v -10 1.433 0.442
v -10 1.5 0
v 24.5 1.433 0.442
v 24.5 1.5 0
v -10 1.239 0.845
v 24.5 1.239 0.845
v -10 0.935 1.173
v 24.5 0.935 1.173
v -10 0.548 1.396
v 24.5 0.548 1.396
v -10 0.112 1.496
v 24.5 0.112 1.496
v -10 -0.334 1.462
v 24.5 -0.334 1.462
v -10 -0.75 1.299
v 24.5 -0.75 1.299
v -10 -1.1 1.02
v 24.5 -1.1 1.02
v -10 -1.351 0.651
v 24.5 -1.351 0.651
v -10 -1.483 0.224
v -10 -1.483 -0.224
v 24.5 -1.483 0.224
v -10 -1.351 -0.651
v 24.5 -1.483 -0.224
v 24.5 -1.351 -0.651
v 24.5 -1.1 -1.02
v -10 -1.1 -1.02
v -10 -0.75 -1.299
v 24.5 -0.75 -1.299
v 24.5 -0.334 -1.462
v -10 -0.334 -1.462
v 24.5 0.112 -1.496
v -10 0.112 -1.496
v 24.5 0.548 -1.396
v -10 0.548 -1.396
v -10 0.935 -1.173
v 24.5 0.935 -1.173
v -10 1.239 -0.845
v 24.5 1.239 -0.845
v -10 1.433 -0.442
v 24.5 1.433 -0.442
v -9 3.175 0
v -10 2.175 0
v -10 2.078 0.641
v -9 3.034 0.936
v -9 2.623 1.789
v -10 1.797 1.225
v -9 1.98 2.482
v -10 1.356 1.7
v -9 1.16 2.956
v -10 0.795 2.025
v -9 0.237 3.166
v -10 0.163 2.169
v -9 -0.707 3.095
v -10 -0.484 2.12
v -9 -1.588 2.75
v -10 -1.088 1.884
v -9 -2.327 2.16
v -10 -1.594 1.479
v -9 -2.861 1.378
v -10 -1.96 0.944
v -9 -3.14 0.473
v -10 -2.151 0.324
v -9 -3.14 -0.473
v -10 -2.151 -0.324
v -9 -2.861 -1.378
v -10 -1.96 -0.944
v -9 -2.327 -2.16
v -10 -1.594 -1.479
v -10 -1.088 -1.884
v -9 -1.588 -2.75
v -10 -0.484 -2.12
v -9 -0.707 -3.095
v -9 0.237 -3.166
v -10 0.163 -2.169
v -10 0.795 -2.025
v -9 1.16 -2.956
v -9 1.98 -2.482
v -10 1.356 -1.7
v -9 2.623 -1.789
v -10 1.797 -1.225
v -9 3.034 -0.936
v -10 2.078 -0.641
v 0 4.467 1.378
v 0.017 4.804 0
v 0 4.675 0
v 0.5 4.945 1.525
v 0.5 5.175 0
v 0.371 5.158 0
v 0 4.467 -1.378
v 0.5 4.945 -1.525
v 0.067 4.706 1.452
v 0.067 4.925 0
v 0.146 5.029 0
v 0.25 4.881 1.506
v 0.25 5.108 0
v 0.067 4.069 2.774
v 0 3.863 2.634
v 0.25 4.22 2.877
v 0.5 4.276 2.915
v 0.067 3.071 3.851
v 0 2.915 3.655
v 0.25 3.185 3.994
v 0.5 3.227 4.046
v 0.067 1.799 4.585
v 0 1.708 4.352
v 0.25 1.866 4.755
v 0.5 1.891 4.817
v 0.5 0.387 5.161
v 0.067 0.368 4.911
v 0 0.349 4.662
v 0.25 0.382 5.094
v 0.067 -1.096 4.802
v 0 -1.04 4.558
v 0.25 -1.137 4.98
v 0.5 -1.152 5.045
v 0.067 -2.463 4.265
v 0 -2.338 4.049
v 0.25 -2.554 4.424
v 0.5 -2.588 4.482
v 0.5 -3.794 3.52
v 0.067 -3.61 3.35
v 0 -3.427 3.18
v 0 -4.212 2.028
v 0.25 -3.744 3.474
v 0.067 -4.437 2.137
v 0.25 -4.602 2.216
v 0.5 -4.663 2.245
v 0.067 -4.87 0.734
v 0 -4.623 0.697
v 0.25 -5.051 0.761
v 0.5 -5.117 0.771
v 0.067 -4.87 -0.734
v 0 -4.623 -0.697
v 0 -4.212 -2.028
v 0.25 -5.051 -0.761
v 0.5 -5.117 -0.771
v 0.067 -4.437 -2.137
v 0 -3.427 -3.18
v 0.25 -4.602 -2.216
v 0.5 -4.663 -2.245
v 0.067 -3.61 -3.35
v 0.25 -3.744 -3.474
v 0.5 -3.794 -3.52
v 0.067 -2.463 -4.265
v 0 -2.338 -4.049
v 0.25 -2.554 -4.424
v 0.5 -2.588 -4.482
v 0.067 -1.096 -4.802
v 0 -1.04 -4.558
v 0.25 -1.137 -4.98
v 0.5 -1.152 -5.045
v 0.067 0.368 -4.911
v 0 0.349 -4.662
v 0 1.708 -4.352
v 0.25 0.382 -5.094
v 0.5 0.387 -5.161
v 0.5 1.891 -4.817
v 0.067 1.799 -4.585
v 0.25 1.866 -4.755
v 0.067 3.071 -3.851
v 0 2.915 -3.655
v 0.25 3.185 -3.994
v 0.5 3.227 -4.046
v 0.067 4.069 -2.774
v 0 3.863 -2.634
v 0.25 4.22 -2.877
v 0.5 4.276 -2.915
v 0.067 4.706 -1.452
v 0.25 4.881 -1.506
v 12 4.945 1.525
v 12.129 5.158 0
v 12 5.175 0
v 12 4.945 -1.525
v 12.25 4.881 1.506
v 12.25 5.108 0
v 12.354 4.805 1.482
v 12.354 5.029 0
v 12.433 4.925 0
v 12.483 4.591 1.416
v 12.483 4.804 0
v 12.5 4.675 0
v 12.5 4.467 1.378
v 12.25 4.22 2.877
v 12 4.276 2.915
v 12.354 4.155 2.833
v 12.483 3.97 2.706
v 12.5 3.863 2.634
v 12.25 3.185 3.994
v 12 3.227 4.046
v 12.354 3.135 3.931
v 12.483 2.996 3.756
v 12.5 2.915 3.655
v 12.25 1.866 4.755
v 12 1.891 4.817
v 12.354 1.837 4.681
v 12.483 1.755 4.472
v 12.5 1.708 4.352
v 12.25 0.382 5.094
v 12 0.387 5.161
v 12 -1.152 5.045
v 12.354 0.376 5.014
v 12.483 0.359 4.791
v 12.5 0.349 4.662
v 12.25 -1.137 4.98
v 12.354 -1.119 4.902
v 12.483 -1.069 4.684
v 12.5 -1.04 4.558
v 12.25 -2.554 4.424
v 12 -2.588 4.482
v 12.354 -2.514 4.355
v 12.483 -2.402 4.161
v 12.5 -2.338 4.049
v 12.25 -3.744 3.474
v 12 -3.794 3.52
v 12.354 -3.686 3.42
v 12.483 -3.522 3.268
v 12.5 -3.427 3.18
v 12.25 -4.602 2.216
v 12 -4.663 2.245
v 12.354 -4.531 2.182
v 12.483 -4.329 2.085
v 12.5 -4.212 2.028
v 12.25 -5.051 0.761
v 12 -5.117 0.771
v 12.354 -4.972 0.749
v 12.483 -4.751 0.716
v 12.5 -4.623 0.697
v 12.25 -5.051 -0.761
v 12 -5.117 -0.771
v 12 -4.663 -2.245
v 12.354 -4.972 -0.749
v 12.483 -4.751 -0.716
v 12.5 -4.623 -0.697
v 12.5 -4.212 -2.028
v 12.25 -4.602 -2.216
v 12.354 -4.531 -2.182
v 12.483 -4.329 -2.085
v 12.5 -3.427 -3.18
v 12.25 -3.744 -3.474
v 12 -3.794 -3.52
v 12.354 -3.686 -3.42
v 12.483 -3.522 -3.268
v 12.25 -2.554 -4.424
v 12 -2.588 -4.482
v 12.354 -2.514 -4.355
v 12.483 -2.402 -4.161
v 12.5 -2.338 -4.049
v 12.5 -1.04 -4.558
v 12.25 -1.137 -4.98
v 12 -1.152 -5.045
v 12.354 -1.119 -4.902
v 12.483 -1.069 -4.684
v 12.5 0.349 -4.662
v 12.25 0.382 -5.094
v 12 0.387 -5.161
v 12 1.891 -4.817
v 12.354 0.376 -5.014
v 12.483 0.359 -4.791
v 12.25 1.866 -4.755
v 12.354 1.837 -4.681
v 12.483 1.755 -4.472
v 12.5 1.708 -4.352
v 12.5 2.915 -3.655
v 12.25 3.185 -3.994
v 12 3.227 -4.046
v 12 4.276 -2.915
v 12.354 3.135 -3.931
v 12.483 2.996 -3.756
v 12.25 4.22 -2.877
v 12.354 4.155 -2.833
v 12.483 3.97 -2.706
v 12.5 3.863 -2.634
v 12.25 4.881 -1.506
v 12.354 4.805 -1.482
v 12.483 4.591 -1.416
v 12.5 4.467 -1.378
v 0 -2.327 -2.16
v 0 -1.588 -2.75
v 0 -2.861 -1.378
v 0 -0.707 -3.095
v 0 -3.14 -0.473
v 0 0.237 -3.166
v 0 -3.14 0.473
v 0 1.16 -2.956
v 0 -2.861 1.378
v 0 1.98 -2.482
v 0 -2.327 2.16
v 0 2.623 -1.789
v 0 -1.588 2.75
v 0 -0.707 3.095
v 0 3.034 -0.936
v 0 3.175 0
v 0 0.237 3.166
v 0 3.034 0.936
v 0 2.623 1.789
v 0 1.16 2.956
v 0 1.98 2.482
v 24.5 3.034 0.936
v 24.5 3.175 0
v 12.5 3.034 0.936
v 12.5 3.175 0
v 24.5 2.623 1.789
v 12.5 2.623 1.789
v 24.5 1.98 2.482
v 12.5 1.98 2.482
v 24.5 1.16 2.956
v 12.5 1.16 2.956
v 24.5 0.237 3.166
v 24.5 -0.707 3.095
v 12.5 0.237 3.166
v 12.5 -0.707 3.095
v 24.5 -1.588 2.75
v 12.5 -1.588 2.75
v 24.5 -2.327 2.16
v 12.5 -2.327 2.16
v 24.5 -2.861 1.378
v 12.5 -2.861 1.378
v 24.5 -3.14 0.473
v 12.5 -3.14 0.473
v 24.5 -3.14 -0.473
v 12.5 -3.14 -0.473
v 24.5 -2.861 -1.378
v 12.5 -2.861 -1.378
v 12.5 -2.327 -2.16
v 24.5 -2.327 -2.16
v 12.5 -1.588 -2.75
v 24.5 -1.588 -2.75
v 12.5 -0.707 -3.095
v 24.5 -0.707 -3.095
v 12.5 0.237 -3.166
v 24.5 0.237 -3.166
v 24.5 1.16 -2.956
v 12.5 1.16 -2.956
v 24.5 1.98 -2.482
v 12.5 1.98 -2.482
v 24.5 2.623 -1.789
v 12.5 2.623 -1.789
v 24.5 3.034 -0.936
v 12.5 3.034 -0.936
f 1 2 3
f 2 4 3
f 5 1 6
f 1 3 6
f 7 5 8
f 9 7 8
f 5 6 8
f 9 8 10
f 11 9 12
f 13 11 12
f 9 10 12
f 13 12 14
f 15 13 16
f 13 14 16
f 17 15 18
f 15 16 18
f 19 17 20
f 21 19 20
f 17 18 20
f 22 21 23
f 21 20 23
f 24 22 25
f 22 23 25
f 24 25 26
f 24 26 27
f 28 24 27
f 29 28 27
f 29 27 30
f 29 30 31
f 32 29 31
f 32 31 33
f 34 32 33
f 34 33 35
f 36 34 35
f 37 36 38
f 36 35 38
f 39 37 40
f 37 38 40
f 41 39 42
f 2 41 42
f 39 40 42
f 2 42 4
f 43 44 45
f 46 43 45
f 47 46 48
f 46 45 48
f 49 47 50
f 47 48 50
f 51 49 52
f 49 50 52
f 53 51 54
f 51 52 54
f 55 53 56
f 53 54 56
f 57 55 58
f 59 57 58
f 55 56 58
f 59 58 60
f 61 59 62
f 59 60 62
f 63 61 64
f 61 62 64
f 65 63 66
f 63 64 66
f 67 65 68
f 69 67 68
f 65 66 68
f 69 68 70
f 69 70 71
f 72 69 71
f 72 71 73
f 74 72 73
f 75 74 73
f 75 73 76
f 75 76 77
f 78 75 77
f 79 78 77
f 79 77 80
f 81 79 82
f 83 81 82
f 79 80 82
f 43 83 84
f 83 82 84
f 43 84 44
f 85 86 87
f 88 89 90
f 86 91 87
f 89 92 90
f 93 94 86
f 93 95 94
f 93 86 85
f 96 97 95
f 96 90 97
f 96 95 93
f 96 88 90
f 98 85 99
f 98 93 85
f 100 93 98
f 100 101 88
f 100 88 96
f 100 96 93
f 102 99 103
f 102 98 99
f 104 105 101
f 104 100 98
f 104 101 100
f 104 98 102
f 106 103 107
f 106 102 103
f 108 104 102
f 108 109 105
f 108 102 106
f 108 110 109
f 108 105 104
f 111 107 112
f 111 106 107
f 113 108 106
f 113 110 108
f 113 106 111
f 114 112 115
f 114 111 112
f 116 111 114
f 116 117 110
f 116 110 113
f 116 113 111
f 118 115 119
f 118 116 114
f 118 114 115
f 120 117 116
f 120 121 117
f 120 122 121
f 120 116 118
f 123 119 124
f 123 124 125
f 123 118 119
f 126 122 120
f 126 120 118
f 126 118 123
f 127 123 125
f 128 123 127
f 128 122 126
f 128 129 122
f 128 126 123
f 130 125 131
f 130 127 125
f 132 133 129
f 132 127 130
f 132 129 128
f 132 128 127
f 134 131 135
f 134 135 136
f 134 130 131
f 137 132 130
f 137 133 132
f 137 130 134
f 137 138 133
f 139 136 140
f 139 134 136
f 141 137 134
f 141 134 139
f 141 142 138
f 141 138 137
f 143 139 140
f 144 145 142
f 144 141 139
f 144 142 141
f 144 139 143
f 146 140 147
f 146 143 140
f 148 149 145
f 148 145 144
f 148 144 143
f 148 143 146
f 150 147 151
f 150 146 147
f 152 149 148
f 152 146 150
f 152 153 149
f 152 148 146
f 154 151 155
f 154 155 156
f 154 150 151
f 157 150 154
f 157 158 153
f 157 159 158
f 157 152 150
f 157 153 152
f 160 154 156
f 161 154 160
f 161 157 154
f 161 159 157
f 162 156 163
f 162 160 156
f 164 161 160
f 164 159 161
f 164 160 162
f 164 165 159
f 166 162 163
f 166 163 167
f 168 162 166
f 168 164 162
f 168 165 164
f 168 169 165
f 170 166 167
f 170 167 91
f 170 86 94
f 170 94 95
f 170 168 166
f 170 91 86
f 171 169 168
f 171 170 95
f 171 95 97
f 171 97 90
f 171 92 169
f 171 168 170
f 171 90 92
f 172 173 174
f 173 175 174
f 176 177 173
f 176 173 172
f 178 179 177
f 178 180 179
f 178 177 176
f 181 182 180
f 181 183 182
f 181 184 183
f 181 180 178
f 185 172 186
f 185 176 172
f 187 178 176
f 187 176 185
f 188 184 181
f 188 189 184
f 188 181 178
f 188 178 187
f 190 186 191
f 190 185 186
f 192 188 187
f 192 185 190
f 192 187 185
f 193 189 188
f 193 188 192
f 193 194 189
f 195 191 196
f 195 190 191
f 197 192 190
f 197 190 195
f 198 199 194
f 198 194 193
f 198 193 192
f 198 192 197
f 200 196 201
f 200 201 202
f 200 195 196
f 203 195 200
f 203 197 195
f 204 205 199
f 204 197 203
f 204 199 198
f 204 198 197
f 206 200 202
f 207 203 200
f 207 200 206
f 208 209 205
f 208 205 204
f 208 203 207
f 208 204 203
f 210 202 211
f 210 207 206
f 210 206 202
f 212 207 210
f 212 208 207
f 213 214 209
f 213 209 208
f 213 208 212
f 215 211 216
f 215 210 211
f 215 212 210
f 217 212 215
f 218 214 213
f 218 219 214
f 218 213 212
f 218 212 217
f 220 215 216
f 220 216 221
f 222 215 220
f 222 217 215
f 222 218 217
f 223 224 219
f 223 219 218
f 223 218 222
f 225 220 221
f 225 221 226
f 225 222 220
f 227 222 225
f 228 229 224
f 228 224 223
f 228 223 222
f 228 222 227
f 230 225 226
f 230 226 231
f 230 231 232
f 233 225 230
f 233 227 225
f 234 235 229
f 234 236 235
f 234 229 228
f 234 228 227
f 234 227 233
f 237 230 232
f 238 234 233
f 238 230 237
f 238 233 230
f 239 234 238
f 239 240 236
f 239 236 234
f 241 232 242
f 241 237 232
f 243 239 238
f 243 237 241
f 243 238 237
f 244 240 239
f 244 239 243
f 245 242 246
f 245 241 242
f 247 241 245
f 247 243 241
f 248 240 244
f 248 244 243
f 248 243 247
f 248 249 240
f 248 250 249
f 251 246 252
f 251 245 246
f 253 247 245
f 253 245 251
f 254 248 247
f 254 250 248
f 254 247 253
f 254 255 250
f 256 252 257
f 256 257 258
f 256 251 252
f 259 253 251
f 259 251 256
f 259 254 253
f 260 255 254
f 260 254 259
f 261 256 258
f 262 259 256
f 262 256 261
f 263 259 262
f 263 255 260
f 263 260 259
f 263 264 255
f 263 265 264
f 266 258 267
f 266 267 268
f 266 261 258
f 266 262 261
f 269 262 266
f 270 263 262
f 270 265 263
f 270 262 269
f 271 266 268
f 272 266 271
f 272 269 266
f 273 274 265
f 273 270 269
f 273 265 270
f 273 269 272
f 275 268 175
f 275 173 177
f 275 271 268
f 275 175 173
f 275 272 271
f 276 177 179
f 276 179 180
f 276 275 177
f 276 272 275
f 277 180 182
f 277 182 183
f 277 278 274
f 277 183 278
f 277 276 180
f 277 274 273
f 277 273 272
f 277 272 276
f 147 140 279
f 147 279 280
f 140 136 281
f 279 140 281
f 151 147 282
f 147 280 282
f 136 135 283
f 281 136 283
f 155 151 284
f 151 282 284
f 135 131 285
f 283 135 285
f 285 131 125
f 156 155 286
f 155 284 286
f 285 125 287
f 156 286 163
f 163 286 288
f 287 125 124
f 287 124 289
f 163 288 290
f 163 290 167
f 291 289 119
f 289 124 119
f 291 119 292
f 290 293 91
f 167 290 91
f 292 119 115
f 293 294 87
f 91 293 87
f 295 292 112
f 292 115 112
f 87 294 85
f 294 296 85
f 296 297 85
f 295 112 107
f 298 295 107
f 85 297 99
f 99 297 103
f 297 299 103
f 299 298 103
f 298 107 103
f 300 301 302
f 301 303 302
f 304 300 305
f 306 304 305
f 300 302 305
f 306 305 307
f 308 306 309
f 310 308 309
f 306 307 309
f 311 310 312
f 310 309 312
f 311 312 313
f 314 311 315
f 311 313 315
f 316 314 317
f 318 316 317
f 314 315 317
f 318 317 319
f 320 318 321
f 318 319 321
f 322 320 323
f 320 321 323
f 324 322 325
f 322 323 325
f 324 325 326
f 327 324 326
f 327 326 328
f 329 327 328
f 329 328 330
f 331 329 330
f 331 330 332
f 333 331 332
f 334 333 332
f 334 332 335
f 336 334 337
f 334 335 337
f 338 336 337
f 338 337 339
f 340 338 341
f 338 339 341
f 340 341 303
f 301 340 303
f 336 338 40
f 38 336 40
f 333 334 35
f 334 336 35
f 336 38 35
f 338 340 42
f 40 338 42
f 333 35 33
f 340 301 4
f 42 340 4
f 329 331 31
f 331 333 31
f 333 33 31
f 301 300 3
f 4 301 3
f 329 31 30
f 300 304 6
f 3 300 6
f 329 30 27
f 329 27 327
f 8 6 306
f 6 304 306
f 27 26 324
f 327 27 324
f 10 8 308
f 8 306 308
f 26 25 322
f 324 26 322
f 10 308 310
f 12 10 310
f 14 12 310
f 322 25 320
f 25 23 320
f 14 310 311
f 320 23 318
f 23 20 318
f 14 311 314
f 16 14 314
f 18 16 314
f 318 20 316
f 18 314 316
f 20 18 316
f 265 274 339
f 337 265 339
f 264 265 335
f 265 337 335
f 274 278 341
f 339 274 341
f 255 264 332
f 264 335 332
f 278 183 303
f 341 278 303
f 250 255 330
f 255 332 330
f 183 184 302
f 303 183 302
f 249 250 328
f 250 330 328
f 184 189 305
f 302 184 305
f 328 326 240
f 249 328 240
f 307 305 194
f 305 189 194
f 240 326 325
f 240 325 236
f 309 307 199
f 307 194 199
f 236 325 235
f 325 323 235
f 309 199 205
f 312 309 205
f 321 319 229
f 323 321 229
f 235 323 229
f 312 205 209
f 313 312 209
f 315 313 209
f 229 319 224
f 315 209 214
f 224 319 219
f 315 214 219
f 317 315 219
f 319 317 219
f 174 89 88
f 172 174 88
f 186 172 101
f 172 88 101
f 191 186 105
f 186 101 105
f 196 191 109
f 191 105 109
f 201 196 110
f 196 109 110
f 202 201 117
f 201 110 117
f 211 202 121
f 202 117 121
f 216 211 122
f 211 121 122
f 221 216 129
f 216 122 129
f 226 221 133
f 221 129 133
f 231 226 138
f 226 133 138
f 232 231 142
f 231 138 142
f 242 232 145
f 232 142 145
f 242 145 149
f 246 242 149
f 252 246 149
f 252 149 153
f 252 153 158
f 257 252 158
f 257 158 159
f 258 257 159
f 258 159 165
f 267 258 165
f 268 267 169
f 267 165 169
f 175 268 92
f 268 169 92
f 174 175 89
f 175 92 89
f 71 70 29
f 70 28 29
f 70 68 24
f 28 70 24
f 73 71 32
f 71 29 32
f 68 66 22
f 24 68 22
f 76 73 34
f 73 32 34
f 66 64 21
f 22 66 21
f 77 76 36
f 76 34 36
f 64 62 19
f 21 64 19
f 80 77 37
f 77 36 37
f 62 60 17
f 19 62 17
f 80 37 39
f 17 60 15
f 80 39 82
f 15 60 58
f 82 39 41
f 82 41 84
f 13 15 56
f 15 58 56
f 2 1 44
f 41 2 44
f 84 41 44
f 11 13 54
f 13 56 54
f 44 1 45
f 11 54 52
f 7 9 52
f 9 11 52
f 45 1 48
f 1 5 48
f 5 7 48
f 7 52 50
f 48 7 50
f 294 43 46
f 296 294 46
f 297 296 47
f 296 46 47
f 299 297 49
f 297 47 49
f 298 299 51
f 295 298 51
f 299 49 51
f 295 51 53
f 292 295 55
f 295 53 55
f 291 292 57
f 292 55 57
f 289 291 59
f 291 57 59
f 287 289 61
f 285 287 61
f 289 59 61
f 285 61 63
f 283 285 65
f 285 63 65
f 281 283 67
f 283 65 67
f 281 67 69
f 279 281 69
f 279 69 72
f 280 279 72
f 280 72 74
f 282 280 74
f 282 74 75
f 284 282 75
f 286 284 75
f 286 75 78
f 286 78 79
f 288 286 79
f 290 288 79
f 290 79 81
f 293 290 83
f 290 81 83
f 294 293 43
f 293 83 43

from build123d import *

# Parameters (mm, degrees)
CHAMFER1_SIZE = 1
FILLET1_R     = 0.5


with BuildPart() as part:
    # Sketch1 → Revolve1 (revolve)
    with BuildSketch(Plane.XY):
        Polygon((24.5, 3.175), (12.5, 3.175), (12.5, 5.175), (0, 5.175), (0, 3.175), (-10, 3.175), (-10, 1.5), (24.5, 1.5), align=None)
    revolve(axis=Axis((-42.941315625, 0, 0), (1, 0, 0)))

    # Chamfer1
    chamfer1_edges = [part.edges().sort_by_distance(p)[0] for p in [
        (-10, -3.175, 0),
    ]]
    chamfer(chamfer1_edges, length=CHAMFER1_SIZE)

    # Fillet1
    fillet1_edges = [part.edges().sort_by_distance(p)[0] for p in [
        (0, -5.175, 0),
        (12.5, -5.175, 0),
    ]]
    fillet(fillet1_edges, radius=FILLET1_R)


solid = part.part
